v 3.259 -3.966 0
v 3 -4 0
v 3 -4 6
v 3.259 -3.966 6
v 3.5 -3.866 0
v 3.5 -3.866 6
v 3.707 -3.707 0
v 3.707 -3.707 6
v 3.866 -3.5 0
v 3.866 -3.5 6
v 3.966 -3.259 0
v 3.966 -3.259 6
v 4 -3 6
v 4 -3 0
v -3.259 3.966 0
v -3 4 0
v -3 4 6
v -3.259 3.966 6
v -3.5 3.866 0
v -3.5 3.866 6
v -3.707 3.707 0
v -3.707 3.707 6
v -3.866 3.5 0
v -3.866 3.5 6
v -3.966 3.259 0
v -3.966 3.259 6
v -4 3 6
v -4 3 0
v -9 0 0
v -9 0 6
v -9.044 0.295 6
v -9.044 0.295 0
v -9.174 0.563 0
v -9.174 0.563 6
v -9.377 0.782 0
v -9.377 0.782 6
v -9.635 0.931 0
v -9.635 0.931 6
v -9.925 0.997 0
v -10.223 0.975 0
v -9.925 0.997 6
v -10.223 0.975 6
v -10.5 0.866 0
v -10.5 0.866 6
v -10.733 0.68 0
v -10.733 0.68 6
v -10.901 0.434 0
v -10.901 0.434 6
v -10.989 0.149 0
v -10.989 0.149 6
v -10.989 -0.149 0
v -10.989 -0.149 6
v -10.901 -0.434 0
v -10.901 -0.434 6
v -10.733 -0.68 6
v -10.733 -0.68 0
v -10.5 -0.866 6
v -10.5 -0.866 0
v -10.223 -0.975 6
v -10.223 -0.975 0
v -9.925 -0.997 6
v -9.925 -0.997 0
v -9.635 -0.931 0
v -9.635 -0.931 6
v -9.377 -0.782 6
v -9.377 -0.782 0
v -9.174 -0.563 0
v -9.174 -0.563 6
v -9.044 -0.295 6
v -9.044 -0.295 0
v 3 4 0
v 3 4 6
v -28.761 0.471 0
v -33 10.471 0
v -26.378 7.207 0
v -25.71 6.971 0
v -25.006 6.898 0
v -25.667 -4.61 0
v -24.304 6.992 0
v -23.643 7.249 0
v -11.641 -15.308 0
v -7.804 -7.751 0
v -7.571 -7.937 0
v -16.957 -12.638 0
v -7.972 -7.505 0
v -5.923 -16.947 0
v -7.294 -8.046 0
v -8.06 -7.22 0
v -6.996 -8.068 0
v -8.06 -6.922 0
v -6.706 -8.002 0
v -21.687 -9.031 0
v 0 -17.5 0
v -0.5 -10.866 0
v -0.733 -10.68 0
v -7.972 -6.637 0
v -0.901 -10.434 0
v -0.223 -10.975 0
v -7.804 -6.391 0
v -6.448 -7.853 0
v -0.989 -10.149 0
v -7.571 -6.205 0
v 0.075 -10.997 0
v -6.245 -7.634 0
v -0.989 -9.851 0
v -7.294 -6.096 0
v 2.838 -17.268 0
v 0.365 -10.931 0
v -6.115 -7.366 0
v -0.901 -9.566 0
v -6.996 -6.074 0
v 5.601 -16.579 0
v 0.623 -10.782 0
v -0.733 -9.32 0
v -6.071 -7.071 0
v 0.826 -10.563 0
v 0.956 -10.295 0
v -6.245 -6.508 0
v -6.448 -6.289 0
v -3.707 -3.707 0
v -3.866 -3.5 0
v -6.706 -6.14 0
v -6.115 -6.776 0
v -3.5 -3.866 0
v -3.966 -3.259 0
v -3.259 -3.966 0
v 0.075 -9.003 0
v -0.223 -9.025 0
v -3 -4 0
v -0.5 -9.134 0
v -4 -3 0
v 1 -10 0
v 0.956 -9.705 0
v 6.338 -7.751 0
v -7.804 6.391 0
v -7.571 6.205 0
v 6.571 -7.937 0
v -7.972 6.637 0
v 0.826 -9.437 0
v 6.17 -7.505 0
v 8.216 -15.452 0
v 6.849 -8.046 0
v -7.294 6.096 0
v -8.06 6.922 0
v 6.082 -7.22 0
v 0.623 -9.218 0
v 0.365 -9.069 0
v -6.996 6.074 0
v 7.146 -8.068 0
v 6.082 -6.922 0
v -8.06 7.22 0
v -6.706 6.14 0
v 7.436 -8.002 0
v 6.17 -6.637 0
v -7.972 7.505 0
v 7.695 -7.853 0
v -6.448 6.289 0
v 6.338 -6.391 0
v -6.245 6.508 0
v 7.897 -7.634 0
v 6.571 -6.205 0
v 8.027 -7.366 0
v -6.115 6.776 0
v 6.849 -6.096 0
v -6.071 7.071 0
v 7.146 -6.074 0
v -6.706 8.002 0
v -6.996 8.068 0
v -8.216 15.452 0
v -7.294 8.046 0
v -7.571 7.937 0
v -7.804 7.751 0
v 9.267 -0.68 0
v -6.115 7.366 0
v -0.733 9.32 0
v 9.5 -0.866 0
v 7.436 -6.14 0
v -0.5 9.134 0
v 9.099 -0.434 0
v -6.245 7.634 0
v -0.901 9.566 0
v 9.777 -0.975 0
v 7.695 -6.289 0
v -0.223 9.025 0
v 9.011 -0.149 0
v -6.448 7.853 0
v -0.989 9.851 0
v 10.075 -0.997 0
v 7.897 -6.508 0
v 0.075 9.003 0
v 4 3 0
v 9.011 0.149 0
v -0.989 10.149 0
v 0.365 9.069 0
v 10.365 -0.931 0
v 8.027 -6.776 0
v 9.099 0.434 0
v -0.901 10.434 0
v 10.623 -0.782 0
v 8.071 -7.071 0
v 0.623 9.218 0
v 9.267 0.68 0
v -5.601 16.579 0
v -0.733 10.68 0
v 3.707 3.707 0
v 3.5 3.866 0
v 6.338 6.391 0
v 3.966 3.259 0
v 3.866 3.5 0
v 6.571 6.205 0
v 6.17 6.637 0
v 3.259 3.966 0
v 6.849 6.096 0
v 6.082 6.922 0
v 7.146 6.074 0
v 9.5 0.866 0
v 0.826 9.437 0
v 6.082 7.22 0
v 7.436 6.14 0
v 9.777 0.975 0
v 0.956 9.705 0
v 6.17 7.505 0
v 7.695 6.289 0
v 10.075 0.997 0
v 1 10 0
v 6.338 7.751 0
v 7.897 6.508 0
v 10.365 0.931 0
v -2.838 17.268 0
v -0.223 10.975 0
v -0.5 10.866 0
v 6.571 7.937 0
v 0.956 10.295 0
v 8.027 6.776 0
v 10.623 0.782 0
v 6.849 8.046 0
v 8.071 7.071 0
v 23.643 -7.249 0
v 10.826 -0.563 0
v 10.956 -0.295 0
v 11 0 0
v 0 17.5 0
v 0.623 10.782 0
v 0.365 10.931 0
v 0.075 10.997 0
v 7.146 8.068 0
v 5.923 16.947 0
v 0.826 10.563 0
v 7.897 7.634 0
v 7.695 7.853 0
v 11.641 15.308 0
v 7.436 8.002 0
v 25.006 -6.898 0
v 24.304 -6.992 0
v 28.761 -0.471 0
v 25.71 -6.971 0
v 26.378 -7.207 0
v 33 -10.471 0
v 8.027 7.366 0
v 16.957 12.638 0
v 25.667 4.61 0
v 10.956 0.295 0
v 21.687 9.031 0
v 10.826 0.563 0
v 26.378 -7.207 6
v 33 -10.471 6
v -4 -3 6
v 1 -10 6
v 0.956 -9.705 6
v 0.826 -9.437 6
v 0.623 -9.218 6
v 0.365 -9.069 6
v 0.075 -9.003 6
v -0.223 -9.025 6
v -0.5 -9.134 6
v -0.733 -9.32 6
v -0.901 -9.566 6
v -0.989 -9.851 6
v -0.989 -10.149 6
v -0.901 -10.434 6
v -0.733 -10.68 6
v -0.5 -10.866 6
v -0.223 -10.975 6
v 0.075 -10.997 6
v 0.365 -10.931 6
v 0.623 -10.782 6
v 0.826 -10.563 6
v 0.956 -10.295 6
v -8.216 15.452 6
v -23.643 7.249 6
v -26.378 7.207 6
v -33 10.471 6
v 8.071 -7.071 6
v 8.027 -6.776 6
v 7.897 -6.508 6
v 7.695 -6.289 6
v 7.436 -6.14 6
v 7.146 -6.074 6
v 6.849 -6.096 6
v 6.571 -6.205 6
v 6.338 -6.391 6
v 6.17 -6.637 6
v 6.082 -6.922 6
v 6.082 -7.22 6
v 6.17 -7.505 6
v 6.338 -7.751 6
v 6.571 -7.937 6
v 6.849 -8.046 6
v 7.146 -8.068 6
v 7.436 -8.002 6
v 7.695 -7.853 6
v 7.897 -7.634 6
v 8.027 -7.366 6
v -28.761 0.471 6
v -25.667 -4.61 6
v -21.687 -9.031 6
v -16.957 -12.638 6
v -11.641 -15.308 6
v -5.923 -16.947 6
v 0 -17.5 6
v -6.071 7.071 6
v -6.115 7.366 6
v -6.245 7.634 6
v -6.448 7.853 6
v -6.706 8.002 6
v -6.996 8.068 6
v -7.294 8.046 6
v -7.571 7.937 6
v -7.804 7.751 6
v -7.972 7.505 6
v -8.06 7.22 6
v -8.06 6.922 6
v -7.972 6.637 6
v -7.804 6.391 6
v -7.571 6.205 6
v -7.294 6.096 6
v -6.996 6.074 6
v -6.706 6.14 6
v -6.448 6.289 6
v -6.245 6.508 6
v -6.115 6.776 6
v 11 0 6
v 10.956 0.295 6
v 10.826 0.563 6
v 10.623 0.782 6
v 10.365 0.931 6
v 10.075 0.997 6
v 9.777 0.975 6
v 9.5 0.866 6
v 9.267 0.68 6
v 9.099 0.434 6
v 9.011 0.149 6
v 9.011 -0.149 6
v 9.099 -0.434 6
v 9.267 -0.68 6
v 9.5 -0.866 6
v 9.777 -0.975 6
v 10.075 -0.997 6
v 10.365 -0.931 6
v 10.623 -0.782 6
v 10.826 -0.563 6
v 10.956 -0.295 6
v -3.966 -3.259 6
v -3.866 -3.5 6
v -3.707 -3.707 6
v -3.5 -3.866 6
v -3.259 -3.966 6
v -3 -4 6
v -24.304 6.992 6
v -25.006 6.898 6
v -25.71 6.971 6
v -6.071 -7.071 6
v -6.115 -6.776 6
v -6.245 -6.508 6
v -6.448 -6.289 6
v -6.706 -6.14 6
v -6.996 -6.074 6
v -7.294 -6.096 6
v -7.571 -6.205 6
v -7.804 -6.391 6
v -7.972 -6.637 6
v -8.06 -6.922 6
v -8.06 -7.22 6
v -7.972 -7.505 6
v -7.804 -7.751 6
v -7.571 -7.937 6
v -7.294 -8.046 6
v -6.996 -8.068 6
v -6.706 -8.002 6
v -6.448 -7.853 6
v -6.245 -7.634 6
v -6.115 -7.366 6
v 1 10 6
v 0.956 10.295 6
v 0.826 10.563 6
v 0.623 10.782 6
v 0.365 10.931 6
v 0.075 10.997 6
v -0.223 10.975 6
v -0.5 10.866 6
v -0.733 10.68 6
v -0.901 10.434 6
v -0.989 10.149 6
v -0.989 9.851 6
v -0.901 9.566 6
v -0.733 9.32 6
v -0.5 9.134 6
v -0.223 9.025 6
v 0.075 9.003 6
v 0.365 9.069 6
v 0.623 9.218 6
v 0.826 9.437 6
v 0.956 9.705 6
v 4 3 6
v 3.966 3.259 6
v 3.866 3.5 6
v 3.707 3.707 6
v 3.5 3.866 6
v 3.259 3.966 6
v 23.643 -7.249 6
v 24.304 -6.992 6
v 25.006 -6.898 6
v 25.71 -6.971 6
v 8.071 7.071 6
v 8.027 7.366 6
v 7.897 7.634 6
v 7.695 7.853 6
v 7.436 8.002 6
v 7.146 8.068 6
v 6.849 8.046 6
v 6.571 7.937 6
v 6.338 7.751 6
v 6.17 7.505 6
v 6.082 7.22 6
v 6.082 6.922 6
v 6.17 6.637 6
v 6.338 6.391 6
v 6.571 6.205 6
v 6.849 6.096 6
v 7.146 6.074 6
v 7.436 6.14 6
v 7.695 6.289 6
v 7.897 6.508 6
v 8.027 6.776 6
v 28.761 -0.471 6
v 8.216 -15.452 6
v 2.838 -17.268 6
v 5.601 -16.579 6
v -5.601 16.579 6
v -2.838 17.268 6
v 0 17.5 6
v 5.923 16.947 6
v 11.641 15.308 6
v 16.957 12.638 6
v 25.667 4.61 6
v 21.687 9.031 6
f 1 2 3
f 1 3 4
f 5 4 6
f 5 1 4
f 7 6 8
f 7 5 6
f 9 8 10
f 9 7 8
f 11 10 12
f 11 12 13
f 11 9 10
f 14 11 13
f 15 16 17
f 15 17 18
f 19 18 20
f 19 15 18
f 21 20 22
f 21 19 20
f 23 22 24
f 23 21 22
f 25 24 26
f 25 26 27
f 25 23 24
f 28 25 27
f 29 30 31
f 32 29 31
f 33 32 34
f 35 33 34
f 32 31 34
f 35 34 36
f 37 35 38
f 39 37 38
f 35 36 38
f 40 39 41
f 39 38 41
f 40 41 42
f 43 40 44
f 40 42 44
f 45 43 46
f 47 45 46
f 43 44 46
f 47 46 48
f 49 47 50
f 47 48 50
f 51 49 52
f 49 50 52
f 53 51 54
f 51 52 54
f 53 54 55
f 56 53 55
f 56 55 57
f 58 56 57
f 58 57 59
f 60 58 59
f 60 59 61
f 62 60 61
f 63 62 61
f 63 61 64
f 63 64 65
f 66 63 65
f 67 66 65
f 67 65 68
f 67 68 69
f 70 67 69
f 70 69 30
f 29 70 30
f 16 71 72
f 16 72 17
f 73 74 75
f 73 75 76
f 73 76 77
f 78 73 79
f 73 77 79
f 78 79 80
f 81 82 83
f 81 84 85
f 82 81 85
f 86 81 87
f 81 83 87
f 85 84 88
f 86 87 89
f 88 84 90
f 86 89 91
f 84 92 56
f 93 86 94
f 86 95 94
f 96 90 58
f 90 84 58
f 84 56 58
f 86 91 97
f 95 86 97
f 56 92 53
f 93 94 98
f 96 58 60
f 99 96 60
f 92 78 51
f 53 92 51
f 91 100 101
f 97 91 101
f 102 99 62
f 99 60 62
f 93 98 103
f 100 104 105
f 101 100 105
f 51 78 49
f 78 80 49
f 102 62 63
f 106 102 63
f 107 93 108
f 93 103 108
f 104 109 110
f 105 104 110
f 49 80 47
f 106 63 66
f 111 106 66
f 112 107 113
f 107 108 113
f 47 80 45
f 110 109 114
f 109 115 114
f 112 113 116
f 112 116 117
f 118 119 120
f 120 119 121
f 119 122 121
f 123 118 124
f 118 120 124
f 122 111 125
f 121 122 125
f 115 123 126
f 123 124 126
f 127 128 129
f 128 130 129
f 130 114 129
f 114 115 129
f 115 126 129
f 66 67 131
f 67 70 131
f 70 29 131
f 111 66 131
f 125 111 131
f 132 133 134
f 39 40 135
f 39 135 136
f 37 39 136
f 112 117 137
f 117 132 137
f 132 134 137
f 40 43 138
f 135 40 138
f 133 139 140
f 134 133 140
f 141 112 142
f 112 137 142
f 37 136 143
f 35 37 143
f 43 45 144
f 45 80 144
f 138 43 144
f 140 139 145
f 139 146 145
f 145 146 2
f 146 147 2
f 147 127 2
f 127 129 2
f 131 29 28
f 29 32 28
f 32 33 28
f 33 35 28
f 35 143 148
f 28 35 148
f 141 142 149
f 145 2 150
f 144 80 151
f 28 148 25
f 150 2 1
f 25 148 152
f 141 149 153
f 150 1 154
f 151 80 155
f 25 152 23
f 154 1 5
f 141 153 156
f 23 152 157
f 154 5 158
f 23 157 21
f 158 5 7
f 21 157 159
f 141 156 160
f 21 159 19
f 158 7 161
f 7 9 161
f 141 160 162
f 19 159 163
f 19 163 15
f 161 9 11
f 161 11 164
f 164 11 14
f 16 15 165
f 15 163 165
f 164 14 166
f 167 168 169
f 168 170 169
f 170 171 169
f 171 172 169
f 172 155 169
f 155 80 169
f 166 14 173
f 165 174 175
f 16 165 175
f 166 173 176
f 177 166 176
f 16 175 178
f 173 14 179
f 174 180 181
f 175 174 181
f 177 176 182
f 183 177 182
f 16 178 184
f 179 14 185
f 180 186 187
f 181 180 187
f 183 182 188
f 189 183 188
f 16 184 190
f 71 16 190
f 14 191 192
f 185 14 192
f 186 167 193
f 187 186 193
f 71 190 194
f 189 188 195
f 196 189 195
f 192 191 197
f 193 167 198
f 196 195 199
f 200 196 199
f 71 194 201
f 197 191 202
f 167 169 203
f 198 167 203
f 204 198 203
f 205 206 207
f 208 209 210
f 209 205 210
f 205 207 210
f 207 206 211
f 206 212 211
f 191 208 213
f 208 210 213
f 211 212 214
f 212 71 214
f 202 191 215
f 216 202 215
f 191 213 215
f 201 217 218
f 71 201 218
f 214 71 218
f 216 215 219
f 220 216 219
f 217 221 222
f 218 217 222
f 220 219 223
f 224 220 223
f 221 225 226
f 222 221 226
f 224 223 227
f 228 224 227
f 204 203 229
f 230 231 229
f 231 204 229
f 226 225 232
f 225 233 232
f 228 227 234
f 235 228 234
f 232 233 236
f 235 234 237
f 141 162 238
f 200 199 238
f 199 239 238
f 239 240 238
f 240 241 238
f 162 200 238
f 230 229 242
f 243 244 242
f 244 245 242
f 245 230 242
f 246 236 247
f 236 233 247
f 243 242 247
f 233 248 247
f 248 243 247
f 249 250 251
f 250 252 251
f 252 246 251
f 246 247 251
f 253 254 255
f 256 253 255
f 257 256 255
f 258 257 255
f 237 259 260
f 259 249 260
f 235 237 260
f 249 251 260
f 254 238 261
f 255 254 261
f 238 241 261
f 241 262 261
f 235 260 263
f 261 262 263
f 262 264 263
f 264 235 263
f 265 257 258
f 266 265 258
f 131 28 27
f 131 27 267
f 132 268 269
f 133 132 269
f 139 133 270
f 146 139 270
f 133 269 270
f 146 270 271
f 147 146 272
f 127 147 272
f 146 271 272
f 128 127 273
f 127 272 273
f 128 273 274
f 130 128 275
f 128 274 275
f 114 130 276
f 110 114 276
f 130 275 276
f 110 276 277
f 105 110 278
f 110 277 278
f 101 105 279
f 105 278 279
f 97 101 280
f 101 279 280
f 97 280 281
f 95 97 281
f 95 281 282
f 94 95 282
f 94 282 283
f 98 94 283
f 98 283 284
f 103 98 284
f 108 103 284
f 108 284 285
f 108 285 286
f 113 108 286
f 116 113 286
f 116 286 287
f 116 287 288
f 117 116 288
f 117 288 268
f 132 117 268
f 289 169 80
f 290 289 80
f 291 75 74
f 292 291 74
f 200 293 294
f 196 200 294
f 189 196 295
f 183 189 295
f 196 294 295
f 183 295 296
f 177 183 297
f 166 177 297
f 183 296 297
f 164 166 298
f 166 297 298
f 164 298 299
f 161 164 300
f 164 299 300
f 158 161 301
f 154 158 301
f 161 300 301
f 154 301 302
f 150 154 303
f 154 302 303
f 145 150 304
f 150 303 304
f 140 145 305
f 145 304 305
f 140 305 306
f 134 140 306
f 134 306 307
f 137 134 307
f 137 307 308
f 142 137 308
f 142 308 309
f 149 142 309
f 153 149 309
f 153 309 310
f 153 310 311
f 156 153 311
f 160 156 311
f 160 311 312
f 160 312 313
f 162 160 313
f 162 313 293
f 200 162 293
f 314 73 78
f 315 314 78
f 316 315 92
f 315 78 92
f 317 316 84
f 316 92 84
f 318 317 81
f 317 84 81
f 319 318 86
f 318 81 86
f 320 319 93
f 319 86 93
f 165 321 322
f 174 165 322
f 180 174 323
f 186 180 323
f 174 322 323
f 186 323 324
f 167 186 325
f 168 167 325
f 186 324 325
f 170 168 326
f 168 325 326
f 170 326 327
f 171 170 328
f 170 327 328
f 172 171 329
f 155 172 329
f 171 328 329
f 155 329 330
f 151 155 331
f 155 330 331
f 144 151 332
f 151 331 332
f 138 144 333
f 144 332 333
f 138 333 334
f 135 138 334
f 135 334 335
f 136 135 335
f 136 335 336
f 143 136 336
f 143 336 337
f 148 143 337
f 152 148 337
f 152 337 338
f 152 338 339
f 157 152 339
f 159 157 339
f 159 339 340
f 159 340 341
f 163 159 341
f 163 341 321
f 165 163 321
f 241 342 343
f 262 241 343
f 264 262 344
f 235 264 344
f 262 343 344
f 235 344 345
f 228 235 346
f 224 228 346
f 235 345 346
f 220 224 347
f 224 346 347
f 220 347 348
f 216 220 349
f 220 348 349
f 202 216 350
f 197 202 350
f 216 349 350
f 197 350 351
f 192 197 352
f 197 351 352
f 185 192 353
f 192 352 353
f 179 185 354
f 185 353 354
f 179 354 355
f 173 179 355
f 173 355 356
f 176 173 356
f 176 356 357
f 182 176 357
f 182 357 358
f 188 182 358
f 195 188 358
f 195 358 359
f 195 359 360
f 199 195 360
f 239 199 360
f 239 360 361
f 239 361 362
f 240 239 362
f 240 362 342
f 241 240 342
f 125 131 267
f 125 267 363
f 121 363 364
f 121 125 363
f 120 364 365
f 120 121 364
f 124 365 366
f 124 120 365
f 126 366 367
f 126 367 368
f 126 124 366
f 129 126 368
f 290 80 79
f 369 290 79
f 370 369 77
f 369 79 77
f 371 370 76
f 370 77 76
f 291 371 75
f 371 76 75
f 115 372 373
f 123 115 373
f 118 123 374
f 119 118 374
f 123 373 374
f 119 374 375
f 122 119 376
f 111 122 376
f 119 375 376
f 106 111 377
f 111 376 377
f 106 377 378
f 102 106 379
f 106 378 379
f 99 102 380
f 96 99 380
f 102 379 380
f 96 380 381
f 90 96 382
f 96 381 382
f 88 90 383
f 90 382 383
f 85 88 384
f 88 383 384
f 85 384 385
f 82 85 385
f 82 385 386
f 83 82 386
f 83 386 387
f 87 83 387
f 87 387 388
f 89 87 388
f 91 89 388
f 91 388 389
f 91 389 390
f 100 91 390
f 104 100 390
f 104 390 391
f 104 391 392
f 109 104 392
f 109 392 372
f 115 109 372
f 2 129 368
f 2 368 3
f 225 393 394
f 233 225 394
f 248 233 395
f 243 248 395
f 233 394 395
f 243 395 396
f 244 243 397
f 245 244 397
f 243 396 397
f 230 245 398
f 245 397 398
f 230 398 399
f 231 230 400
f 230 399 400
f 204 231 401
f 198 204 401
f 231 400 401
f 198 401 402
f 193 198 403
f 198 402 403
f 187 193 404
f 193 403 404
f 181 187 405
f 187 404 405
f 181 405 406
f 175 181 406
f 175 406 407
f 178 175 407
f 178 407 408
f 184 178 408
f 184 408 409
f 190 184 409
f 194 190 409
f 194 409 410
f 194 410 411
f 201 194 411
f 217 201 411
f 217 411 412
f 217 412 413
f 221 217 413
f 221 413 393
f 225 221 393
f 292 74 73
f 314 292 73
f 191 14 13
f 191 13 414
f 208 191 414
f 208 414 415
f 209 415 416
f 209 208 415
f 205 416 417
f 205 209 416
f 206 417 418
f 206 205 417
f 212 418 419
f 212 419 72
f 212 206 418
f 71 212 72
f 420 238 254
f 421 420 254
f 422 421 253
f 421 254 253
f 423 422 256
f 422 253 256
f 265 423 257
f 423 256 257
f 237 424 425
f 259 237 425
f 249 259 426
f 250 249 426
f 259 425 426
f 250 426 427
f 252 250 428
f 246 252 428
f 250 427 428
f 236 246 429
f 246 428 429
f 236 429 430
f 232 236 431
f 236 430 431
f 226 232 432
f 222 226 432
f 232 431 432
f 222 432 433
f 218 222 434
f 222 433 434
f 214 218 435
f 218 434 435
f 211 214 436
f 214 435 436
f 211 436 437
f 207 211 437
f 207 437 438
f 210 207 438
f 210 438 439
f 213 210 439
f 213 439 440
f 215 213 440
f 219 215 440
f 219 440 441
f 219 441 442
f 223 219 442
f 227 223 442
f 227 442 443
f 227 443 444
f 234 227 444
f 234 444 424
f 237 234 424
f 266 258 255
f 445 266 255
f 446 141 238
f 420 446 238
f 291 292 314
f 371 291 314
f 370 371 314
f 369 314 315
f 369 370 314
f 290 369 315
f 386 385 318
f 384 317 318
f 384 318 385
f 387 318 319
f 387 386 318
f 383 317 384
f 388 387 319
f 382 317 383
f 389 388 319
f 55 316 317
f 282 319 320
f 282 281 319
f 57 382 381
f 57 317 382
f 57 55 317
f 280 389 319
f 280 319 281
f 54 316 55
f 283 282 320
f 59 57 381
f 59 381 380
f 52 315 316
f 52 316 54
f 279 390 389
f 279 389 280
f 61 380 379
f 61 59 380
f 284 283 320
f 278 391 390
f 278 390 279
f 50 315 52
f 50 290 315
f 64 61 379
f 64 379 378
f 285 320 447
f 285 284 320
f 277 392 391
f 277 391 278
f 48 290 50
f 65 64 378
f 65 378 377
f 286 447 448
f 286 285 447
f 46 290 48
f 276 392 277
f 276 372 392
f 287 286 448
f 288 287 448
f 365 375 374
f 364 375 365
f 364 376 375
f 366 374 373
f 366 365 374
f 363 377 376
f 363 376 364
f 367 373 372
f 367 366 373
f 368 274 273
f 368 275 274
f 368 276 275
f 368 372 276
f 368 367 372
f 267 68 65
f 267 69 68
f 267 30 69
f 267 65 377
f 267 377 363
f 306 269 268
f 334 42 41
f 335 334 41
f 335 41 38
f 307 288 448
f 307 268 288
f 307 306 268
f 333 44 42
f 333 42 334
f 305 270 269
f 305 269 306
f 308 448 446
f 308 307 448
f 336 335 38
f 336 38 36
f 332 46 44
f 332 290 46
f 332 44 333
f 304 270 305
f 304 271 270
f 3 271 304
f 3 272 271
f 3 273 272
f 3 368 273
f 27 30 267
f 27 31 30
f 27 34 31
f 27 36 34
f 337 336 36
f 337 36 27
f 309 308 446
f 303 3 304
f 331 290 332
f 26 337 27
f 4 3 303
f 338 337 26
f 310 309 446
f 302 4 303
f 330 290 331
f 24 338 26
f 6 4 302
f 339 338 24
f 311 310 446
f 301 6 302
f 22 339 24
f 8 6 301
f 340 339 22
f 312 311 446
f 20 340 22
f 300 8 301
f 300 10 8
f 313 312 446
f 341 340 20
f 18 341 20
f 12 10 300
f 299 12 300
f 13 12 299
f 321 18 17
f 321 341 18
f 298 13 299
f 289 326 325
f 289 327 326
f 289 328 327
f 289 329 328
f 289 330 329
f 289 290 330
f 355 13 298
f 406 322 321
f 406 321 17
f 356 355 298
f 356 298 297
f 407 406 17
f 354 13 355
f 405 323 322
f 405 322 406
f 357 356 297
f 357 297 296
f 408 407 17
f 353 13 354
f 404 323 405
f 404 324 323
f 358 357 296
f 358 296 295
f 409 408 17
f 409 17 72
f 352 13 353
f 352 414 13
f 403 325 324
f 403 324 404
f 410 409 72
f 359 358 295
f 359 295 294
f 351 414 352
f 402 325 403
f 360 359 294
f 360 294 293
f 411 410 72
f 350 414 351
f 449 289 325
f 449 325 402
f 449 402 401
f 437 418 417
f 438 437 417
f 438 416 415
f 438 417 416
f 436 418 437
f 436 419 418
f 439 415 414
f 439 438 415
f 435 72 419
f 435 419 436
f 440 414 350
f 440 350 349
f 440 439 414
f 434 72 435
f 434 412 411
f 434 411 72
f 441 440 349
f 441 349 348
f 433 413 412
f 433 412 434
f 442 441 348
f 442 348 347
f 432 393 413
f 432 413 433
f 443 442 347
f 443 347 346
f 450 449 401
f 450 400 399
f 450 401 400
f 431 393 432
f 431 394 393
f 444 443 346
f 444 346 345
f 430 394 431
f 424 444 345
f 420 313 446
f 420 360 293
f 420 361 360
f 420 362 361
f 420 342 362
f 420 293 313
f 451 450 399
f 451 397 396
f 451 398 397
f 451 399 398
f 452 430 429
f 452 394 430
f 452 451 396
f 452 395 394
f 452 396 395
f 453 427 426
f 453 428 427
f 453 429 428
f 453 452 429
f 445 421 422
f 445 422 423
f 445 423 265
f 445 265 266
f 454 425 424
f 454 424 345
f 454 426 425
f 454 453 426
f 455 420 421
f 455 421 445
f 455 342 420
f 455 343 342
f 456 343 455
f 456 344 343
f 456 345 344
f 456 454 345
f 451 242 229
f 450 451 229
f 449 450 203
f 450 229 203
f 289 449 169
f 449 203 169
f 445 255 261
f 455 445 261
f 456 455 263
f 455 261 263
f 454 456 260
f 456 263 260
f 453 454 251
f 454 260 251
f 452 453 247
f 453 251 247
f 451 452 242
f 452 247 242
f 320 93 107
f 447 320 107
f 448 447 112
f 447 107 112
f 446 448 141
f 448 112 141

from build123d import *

# Parameters (mm, degrees)
EXTRUDE_1_DEPTH     = 6
SKETCH_2_R          = 1
CUT_EXTRUDE_1_DEPTH = 38.831864876


with BuildPart() as part:
    # 草图1 → 凸台-拉伸1 (new body)
    with BuildSketch(Plane.XY):
        with BuildLine():
            Line((8.215752349, -15.451582875), (23.643338017, -7.248590067))
            ThreePointArc((23.643338017, -7.248590067), (25.005690113, -6.897786494), (26.378171201, -7.206593948))
            Line((26.378171201, -7.206593948), (33, -10.470749302))
            Line((33, -10.470749302), (28.760739296, -0.470749302))
            ThreePointArc((28.760739296, -0.470749302), (16.956768231, 12.637944122), (0, 17.5))
            ThreePointArc((0, 17.5), (-4.233633173, 16.98017521), (-8.215752349, 15.451582875))
            Line((-8.215752349, 15.451582875), (-23.643338017, 7.248590067))
            ThreePointArc((-23.643338017, 7.248590067), (-25.005690113, 6.897786494), (-26.378171201, 7.206593948))
            Line((-26.378171201, 7.206593948), (-33, 10.470749302))
            Line((-33, 10.470749302), (-28.760739296, 0.470749302))
            ThreePointArc((-28.760739296, 0.470749302), (-16.956768231, -12.637944122), (0, -17.5))
            ThreePointArc((0, -17.5), (4.233633173, -16.98017521), (8.215752349, -15.451582875))
        make_face()
        with BuildLine():
            Line((-3, -4), (3, -4))
            ThreePointArc((3, -4), (3.707106781, -3.707106781), (4, -3))
            Line((4, -3), (4, 3))
            ThreePointArc((4, 3), (3.707106781, 3.707106781), (3, 4))
            Line((3, 4), (-3, 4))
            ThreePointArc((-3, 4), (-3.707106781, 3.707106781), (-4, 3))
            Line((-4, 3), (-4, -3))
            ThreePointArc((-4, -3), (-3.707106781, -3.707106781), (-3, -4))
        make_face(mode=Mode.SUBTRACT)
    extrude(amount=EXTRUDE_1_DEPTH)

    # 草图2 → 切除-拉伸1 (cut, through all)
    with BuildSketch(Plane.XY.offset(6)):
        with Locations((0, 10)):
            Circle(SKETCH_2_R)
        with Locations((7.071067812, 7.071067812)):
            Circle(SKETCH_2_R)
        with Locations((10, 0)):
            Circle(SKETCH_2_R)
        with Locations((7.071067812, -7.071067812)):
            Circle(SKETCH_2_R)
        with Locations((0, -10)):
            Circle(SKETCH_2_R)
        with Locations((-7.071067812, -7.071067812)):
            Circle(SKETCH_2_R)
        with Locations((-10, 0)):
            Circle(SKETCH_2_R)
        with Locations((-7.071067812, 7.071067812)):
            Circle(SKETCH_2_R)
    extrude(amount=-CUT_EXTRUDE_1_DEPTH, mode=Mode.SUBTRACT)


solid = part.part
